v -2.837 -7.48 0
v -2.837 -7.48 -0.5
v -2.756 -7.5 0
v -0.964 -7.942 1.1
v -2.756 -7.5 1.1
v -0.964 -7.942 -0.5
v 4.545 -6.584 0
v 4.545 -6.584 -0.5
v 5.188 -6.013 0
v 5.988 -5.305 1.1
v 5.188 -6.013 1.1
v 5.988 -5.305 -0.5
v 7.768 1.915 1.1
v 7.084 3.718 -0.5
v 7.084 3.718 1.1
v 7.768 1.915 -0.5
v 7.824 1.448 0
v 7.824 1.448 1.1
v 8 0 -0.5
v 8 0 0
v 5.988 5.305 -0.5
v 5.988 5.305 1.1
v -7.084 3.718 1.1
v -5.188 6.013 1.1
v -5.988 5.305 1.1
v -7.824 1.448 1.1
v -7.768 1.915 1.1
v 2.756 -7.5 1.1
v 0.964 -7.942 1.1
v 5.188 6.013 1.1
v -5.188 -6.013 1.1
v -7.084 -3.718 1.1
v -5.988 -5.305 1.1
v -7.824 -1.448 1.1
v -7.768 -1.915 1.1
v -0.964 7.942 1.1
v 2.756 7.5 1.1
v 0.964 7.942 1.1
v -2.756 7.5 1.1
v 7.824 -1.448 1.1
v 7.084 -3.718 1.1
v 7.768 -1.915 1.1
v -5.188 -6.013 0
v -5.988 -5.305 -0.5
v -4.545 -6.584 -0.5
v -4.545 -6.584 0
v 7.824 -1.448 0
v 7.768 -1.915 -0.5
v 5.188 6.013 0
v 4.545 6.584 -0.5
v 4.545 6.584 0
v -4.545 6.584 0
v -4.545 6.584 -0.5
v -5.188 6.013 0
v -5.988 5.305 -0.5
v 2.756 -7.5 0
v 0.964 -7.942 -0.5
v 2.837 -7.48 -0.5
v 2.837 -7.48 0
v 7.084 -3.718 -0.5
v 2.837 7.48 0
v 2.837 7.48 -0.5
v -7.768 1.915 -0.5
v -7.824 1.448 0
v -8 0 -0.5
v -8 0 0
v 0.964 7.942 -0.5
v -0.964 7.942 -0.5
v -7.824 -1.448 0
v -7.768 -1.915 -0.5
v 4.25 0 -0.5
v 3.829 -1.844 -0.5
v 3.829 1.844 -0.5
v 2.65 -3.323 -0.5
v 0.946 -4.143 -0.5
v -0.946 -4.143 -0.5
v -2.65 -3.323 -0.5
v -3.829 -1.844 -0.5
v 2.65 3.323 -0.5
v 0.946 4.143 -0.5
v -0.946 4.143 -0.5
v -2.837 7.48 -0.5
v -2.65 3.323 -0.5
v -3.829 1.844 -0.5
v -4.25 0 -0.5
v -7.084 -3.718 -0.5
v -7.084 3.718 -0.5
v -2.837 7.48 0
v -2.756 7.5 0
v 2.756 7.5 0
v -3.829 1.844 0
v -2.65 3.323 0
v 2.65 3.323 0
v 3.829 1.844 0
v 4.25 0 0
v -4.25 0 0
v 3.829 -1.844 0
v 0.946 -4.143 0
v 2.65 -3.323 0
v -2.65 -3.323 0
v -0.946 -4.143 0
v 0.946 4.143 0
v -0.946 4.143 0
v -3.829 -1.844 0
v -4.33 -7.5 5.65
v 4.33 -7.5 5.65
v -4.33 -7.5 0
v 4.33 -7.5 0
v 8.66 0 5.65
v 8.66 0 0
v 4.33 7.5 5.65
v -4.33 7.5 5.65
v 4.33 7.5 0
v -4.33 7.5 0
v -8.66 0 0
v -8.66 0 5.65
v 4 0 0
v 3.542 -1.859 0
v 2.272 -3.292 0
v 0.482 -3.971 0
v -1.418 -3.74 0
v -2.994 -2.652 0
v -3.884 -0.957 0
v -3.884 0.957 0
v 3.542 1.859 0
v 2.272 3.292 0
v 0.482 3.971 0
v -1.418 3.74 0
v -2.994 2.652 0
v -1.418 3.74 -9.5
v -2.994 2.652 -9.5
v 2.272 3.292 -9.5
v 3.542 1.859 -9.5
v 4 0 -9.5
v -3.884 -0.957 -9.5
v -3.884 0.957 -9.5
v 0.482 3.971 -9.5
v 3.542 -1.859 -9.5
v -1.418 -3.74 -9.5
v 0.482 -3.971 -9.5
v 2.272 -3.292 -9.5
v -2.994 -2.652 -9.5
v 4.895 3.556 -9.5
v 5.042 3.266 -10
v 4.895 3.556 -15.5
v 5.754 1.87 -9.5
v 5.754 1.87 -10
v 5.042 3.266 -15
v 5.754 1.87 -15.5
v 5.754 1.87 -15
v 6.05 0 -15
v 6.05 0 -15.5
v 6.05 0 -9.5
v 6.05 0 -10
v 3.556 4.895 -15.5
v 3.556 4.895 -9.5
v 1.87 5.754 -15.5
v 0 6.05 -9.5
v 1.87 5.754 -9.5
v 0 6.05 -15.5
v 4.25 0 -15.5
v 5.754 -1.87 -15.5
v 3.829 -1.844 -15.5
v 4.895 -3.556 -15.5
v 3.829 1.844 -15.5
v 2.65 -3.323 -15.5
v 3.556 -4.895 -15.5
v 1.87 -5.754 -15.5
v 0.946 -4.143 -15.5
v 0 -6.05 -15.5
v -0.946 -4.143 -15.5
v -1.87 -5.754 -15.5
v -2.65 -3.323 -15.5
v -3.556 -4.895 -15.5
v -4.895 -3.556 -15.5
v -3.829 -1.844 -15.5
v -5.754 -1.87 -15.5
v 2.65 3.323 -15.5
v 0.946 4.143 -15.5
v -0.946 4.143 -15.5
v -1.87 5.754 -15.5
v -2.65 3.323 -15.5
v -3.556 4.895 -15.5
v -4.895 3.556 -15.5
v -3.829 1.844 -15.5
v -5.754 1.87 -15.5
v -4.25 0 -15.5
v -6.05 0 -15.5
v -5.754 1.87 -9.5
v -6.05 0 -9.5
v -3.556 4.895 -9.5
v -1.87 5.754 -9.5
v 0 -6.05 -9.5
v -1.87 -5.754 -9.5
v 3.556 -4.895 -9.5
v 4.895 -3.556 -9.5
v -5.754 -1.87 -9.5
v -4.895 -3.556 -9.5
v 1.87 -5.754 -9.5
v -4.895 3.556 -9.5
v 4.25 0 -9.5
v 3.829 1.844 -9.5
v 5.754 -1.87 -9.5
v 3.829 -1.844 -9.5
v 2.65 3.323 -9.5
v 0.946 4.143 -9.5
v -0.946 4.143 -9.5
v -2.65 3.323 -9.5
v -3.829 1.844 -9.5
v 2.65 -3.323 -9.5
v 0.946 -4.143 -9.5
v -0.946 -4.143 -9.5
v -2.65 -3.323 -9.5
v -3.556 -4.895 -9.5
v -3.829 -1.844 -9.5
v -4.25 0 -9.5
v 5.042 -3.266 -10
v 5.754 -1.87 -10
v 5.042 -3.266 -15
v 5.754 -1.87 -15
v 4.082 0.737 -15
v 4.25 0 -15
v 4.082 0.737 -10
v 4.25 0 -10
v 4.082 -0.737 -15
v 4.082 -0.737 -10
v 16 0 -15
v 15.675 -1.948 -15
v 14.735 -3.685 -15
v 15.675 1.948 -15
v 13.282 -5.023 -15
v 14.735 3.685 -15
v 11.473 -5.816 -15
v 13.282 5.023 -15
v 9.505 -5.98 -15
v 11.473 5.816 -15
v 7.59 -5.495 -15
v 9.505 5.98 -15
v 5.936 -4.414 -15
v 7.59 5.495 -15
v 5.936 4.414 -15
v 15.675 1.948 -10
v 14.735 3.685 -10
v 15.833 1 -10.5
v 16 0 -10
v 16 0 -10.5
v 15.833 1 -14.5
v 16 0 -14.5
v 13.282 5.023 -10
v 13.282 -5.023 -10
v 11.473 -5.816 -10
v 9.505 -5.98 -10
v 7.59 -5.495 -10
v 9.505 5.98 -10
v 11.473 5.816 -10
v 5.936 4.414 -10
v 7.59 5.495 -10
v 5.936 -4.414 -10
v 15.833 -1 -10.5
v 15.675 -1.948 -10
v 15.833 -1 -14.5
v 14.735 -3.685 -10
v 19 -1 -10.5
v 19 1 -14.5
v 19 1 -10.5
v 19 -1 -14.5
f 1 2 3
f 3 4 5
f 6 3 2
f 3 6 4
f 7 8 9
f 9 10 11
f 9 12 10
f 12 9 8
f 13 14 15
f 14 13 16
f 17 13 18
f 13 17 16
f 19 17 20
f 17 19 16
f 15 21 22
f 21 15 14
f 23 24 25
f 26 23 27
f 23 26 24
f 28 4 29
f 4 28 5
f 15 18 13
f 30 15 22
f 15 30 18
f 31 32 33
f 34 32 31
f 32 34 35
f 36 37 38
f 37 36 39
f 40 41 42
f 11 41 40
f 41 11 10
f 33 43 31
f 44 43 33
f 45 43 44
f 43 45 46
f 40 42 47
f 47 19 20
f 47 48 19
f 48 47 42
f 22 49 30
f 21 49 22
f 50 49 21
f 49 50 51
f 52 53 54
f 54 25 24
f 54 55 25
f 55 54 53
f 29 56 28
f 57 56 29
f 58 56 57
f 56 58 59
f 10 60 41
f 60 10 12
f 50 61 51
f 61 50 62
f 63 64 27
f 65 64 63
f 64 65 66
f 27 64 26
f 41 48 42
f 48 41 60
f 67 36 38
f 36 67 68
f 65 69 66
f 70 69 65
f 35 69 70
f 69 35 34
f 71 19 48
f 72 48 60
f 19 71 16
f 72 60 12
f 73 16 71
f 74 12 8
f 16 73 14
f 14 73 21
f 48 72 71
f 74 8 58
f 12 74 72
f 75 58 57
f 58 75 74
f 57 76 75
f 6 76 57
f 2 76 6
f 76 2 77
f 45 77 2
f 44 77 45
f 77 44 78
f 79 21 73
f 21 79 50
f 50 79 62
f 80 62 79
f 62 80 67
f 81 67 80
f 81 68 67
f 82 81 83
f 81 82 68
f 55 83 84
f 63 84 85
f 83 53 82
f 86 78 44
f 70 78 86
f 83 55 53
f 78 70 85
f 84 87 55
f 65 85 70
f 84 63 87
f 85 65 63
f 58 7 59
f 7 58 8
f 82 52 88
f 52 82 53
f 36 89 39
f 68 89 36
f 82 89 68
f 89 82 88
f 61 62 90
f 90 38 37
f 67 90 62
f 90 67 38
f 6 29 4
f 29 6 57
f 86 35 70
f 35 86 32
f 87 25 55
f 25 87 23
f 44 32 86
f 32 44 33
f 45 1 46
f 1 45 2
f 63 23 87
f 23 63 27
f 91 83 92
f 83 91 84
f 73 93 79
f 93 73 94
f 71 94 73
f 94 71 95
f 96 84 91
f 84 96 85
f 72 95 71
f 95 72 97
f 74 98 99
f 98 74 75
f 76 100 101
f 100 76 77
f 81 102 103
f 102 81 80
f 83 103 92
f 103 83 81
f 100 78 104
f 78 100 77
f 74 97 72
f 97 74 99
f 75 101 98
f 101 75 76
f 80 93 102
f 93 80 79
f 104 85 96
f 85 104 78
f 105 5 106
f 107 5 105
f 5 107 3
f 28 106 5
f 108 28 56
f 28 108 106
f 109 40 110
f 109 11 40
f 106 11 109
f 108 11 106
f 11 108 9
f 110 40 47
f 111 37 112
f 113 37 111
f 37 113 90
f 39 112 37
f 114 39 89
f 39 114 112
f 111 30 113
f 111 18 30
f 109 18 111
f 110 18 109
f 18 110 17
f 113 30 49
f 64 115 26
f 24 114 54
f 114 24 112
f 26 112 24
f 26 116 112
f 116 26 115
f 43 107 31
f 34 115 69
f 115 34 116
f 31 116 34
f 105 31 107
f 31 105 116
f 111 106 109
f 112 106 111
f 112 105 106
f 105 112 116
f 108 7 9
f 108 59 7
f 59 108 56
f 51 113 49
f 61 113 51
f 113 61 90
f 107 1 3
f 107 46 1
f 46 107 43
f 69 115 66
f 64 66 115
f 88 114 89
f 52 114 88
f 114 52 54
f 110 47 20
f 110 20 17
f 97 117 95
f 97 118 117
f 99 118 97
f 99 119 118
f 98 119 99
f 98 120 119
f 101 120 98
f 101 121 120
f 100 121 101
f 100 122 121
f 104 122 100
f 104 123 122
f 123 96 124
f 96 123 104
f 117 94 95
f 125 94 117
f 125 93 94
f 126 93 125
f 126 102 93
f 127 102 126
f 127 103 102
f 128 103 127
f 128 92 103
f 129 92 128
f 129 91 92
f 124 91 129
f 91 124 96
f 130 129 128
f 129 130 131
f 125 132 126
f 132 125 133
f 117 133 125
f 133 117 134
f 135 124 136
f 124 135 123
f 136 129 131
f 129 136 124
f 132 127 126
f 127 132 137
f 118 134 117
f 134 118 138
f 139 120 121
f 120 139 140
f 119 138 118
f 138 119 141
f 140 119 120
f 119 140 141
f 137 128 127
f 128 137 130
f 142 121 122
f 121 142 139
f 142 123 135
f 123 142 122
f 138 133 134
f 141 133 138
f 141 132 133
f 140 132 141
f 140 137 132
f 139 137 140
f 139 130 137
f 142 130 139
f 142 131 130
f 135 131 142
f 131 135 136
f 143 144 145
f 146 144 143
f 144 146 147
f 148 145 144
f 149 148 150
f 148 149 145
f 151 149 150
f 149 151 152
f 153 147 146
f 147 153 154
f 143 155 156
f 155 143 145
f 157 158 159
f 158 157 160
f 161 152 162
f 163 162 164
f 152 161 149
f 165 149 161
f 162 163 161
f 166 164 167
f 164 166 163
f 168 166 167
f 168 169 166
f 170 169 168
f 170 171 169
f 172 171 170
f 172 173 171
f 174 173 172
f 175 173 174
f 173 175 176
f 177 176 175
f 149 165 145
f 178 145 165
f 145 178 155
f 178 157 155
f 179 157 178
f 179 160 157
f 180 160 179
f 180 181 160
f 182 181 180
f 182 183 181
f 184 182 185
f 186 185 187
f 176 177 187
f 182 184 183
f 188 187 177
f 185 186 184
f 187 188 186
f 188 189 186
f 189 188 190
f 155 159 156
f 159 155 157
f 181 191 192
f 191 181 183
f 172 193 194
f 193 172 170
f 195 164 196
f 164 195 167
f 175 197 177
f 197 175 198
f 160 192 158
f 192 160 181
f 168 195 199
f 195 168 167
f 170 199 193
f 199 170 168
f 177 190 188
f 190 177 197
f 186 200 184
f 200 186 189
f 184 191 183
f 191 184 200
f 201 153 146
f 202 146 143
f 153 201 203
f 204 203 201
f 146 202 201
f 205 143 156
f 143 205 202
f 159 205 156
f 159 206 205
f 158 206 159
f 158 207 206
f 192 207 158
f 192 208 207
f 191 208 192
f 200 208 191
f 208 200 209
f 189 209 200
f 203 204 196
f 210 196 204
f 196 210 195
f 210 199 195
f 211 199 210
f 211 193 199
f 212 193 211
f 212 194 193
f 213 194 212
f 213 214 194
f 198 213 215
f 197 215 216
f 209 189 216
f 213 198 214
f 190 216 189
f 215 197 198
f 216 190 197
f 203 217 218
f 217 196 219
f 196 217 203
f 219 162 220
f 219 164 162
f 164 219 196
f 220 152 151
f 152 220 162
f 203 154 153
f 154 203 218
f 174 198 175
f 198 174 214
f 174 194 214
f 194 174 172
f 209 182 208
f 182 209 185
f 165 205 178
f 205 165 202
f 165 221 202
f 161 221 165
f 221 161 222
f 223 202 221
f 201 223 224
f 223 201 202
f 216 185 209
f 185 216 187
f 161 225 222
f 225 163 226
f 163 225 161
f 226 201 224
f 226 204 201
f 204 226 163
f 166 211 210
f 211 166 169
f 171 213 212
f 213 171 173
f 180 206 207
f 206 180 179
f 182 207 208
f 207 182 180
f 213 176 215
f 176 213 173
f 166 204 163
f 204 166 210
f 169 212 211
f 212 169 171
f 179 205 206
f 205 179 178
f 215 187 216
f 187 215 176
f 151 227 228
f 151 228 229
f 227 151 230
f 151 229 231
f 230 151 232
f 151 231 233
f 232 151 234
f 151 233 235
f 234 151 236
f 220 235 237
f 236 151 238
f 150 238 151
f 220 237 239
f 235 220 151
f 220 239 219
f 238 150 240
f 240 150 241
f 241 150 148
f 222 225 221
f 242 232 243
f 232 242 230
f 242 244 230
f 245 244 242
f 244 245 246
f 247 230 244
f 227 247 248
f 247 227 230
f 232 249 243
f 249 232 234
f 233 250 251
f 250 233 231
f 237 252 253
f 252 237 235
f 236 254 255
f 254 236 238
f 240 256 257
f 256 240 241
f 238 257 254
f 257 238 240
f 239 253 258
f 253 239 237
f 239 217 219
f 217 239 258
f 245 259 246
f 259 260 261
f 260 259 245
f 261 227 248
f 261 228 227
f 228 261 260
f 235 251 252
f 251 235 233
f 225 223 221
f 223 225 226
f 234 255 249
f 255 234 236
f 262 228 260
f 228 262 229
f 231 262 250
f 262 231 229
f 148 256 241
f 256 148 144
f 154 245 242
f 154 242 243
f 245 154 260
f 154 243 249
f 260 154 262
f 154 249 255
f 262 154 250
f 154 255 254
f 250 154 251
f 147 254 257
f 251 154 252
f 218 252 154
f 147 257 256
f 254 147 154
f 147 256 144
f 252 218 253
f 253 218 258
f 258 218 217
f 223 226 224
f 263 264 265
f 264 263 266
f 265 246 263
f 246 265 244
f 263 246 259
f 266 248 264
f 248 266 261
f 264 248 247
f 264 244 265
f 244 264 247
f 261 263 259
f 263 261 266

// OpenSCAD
// Parameters
shaft_diameter_mm = 8; //[4:16:0.1]
head_across_flats_mm = 15; //[7.5:30:0.1]
head_height_mm = 5.65; //[2.8:11.3:0.05]
length_under_head_mm = 10; //[5:20:0.1]
overlap_mm = 1; //[0.5:2:0.1]
washer_outer_diameter_mm = 16; //[8:32:0.1]
washer_thickness_mm = 1.6; //[0.8:3.2:0.1]
washer_hole_diameter_mm = 8.5; //[4.5:17:0.1]
pcb_spacer_height_mm = 6; //[3:12:0.1]
pcb_spacer_wall_mm = 1.8; //[0.9:3.6:0.1]
buzzer_diameter_mm = 12; //[6:24:0.1]
buzzer_height_mm = 5; //[2.5:10:0.1]
buzzer_offset_x_mm = 10; //[5:20:0.1]
bridge_width_mm = 4; //[2:8:0.1]
bridge_thickness_mm = 2; //[1:4:0.1]

// Derived radii
shaft_r = shaft_diameter_mm/2;
head_r  = (head_across_flats_mm/2)/cos(30);
washer_r = washer_outer_diameter_mm/2;
washer_hole_r = washer_hole_diameter_mm/2;
spacer_outer_r = washer_hole_r + pcb_spacer_wall_mm;
buzzer_r = buzzer_diameter_mm/2;

// Z reference: underside of head at z=0
z_head_center   = head_height_mm/2;

// Shaft overlaps into head by overlap_mm
z_shaft_center  = -length_under_head_mm/2 + overlap_mm/2;

// Washer overlaps into head underside by overlap_mm
z_washer_center = washer_thickness_mm/2 - overlap_mm/2;

// Spacer overlaps into shaft end by overlap_mm
z_spacer_center = -length_under_head_mm - pcb_spacer_height_mm/2 + overlap_mm/2;

// Place buzzer at same Z as spacer for robust bridge contact
z_buzzer_center = z_spacer_center;

// Screw and Washer - connected geometry
module screw_and_washer() {
  color("DimGray")
  union() {
    // Hex Head
    translate([0, 0, z_head_center])
      cylinder(h=head_height_mm, r=head_r, center=true, $fn=6);

    // Shaft (overlaps into head by overlap_mm)
    translate([0, 0, z_shaft_center])
      cylinder(h=length_under_head_mm, r=shaft_r, center=true);

    // Washer (overlaps into head underside by overlap_mm)
    difference() {
      translate([0, 0, z_washer_center])
        cylinder(h=washer_thickness_mm, r=washer_r, center=true);
      translate([0, 0, z_washer_center])
        cylinder(h=washer_thickness_mm + 2*overlap_mm, r=washer_hole_r, center=true);
    }
  }
}

// PCB Spacer - connected to shaft end by overlap
module pcb_spacer() {
  color("Silver")
  difference() {
    translate([0, 0, z_spacer_center])
      cylinder(h=pcb_spacer_height_mm, r=spacer_outer_r, center=true);
    translate([0, 0, z_spacer_center])
      cylinder(h=pcb_spacer_height_mm + 2*overlap_mm, r=washer_hole_r, center=true);
  }
}

// Buzzer - connected to bridge (and bridge connected to spacer)
module buzzer() {
  color("Black")
  translate([buzzer_offset_x_mm, 0, z_buzzer_center])
    cylinder(h=buzzer_height_mm, r=buzzer_r, center=true);
}

// Buzzer Bridge + End Cap
// FIX: ensure the black cylinder subassembly is physically attached to the main body
// by making the bridge overlap into BOTH the spacer and the buzzer by 1-2mm.
module buzzer_bridge_and_cap() {
  // Bridge spans from spacer outer surface to buzzer outer surface, with overlap on both ends.
  // Left end (toward spacer): x = spacer_outer_r - overlap_mm
  // Right end (toward buzzer): x = (buzzer_offset_x_mm - buzzer_r) + overlap_mm
  x_left  = spacer_outer_r - overlap_mm;
  x_right = (buzzer_offset_x_mm - buzzer_r) + overlap_mm;

  bridge_len = x_right - x_left;
  bridge_center_x = (x_left + x_right)/2;

  // Keep bridge centered at same Z as buzzer/spacer so it intersects both
  bridge_center_z = z_buzzer_center;

  // Small rectangular end cap at buzzer far end, overlapped into buzzer by overlap_mm
  cap_len = 4;
  cap_w   = bridge_thickness_mm;
  cap_h   = bridge_width_mm;

  // Cap overlaps into buzzer at its +X face:
  // buzzer +X face is at x = buzzer_offset_x_mm + buzzer_r
  cap_center_x = (buzzer_offset_x_mm + buzzer_r) + cap_len/2 - overlap_mm;
  cap_center_z = bridge_center_z;

  color("Silver")
  union() {
    // Bridge (guaranteed to intersect spacer and buzzer)
    translate([bridge_center_x, 0, bridge_center_z])
      cube([bridge_len, bridge_thickness_mm, bridge_width_mm], center=true);

    // End cap (guaranteed to intersect buzzer and bridge)
    translate([cap_center_x, 0, cap_center_z])
      cube([cap_len, cap_w, cap_h], center=true);
  }
}

// Assembly - single solid union (no floating parts)
module assembly() {
  union() {
    screw_and_washer();
    pcb_spacer();
    buzzer();
    buzzer_bridge_and_cap();
  }
}

assembly();
